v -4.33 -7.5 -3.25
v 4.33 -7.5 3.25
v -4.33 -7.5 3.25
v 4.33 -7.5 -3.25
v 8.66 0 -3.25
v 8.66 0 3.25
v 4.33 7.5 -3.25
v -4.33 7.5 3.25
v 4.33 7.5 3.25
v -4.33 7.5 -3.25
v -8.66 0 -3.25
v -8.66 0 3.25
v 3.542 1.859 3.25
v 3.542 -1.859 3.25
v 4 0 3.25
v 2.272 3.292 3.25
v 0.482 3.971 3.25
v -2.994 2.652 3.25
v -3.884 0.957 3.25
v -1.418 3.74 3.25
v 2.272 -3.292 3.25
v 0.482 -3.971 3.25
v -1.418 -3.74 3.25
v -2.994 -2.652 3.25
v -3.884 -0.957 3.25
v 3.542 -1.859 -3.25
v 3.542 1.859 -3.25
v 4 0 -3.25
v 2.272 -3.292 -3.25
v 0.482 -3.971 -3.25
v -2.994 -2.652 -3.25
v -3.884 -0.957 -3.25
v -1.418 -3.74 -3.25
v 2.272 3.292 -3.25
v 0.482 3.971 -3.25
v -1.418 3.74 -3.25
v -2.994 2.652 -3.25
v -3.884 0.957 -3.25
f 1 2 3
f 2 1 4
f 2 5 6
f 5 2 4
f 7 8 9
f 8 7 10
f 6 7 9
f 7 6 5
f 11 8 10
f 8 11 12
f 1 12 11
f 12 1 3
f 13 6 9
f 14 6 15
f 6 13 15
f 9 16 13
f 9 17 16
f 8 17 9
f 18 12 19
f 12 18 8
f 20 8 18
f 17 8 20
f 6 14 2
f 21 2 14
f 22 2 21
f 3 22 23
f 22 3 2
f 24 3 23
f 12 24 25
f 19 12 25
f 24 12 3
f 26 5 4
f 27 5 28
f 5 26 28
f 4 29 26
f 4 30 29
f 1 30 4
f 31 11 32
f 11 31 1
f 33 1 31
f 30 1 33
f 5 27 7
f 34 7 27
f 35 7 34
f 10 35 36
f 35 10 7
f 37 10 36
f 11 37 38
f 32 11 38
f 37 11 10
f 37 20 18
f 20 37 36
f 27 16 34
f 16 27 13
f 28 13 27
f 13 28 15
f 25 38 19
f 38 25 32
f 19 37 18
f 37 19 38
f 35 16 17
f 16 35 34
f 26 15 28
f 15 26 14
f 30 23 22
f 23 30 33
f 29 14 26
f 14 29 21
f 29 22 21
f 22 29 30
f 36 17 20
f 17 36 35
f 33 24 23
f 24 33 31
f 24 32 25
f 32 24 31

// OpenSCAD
// Parameters
thread_nominal_diameter_mm = 8.0; //[4.0:16.0:0.1]
across_flats_mm = 15.0; //[7.5:30.0:0.1]
thickness_mm = 6.5; //[3.0:13.0:0.1]
hole_diameter_mm = 8.0; //[4.0:16.0:0.1]
threaded = 0; //[0:1:1]
lead_in_chamfer_mm = 0.5; //[0.0:2.0:0.1]
eps_mm = 0.2; //[0.05:0.5:0.05]
thread_pitch_mm = 1.25; //[0.5:2.5:0.05]
thread_depth_mm = 0.35; //[0.1:0.8:0.05]
washer_enabled = 0; //[0:1:1]
washer_outer_diameter_mm = 16.0; //[8.0:32.0:0.1]
washer_thickness_mm = 1.6; //[0.8:3.2:0.1]
washer_hole_diameter_mm = 8.4; //[4.0:18.0:0.1]
connect_overlap_mm = 0.8; //[0.5:2.0:0.1]

// Hexagonal Nut
module nut() {
  color("DimGray") {
    difference() {
      // Hexagonal body
      cylinder(r=across_flats_mm/(2*cos(30)), h=thickness_mm, center=true, $fn=6);
      // Central through-hole
      translate([0, 0, 0])
        cylinder(r=hole_diameter_mm/2, h=thickness_mm + 2*eps_mm, center=true);
      // Top chamfer
      translate([0, 0, thickness_mm/2 - lead_in_chamfer_mm/2 + eps_mm/2])
        rotate([180, 0, 0])
        cylinder(r1=hole_diameter_mm/2 + lead_in_chamfer_mm, r2=0, h=lead_in_chamfer_mm, center=true);
      // Bottom chamfer
      translate([0, 0, -thickness_mm/2 + lead_in_chamfer_mm/2 - eps_mm/2])
        cylinder(r1=hole_diameter_mm/2 + lead_in_chamfer_mm, r2=0, h=lead_in_chamfer_mm, center=true);
      // Optional thread representation
      if (threaded == 1) {
        translate([0, 0, 0])
          cylinder(r=thread_nominal_diameter_mm/2 + thread_depth_mm, h=thickness_mm + 2*eps_mm, center=true);
      }
    }
  }
}

// Nut and Washer
module nut_and_washer() {
  union() {
    nut();
    if (washer_enabled == 1) {
      color("Silver") {
        difference() {
          // Washer outer
          translate([0, 0, -(thickness_mm/2 + washer_thickness_mm/2 - connect_overlap_mm)])
            cylinder(r=washer_outer_diameter_mm/2, h=washer_thickness_mm, center=true);
          // Washer hole
          translate([0, 0, -(thickness_mm/2 + washer_thickness_mm/2 - connect_overlap_mm)])
            cylinder(r=washer_hole_diameter_mm/2, h=washer_thickness_mm + 2*eps_mm, center=true);
        }
      }
    }
  }
}

// Assembly
module assembly() {
  nut_and_washer();
}

assembly();
